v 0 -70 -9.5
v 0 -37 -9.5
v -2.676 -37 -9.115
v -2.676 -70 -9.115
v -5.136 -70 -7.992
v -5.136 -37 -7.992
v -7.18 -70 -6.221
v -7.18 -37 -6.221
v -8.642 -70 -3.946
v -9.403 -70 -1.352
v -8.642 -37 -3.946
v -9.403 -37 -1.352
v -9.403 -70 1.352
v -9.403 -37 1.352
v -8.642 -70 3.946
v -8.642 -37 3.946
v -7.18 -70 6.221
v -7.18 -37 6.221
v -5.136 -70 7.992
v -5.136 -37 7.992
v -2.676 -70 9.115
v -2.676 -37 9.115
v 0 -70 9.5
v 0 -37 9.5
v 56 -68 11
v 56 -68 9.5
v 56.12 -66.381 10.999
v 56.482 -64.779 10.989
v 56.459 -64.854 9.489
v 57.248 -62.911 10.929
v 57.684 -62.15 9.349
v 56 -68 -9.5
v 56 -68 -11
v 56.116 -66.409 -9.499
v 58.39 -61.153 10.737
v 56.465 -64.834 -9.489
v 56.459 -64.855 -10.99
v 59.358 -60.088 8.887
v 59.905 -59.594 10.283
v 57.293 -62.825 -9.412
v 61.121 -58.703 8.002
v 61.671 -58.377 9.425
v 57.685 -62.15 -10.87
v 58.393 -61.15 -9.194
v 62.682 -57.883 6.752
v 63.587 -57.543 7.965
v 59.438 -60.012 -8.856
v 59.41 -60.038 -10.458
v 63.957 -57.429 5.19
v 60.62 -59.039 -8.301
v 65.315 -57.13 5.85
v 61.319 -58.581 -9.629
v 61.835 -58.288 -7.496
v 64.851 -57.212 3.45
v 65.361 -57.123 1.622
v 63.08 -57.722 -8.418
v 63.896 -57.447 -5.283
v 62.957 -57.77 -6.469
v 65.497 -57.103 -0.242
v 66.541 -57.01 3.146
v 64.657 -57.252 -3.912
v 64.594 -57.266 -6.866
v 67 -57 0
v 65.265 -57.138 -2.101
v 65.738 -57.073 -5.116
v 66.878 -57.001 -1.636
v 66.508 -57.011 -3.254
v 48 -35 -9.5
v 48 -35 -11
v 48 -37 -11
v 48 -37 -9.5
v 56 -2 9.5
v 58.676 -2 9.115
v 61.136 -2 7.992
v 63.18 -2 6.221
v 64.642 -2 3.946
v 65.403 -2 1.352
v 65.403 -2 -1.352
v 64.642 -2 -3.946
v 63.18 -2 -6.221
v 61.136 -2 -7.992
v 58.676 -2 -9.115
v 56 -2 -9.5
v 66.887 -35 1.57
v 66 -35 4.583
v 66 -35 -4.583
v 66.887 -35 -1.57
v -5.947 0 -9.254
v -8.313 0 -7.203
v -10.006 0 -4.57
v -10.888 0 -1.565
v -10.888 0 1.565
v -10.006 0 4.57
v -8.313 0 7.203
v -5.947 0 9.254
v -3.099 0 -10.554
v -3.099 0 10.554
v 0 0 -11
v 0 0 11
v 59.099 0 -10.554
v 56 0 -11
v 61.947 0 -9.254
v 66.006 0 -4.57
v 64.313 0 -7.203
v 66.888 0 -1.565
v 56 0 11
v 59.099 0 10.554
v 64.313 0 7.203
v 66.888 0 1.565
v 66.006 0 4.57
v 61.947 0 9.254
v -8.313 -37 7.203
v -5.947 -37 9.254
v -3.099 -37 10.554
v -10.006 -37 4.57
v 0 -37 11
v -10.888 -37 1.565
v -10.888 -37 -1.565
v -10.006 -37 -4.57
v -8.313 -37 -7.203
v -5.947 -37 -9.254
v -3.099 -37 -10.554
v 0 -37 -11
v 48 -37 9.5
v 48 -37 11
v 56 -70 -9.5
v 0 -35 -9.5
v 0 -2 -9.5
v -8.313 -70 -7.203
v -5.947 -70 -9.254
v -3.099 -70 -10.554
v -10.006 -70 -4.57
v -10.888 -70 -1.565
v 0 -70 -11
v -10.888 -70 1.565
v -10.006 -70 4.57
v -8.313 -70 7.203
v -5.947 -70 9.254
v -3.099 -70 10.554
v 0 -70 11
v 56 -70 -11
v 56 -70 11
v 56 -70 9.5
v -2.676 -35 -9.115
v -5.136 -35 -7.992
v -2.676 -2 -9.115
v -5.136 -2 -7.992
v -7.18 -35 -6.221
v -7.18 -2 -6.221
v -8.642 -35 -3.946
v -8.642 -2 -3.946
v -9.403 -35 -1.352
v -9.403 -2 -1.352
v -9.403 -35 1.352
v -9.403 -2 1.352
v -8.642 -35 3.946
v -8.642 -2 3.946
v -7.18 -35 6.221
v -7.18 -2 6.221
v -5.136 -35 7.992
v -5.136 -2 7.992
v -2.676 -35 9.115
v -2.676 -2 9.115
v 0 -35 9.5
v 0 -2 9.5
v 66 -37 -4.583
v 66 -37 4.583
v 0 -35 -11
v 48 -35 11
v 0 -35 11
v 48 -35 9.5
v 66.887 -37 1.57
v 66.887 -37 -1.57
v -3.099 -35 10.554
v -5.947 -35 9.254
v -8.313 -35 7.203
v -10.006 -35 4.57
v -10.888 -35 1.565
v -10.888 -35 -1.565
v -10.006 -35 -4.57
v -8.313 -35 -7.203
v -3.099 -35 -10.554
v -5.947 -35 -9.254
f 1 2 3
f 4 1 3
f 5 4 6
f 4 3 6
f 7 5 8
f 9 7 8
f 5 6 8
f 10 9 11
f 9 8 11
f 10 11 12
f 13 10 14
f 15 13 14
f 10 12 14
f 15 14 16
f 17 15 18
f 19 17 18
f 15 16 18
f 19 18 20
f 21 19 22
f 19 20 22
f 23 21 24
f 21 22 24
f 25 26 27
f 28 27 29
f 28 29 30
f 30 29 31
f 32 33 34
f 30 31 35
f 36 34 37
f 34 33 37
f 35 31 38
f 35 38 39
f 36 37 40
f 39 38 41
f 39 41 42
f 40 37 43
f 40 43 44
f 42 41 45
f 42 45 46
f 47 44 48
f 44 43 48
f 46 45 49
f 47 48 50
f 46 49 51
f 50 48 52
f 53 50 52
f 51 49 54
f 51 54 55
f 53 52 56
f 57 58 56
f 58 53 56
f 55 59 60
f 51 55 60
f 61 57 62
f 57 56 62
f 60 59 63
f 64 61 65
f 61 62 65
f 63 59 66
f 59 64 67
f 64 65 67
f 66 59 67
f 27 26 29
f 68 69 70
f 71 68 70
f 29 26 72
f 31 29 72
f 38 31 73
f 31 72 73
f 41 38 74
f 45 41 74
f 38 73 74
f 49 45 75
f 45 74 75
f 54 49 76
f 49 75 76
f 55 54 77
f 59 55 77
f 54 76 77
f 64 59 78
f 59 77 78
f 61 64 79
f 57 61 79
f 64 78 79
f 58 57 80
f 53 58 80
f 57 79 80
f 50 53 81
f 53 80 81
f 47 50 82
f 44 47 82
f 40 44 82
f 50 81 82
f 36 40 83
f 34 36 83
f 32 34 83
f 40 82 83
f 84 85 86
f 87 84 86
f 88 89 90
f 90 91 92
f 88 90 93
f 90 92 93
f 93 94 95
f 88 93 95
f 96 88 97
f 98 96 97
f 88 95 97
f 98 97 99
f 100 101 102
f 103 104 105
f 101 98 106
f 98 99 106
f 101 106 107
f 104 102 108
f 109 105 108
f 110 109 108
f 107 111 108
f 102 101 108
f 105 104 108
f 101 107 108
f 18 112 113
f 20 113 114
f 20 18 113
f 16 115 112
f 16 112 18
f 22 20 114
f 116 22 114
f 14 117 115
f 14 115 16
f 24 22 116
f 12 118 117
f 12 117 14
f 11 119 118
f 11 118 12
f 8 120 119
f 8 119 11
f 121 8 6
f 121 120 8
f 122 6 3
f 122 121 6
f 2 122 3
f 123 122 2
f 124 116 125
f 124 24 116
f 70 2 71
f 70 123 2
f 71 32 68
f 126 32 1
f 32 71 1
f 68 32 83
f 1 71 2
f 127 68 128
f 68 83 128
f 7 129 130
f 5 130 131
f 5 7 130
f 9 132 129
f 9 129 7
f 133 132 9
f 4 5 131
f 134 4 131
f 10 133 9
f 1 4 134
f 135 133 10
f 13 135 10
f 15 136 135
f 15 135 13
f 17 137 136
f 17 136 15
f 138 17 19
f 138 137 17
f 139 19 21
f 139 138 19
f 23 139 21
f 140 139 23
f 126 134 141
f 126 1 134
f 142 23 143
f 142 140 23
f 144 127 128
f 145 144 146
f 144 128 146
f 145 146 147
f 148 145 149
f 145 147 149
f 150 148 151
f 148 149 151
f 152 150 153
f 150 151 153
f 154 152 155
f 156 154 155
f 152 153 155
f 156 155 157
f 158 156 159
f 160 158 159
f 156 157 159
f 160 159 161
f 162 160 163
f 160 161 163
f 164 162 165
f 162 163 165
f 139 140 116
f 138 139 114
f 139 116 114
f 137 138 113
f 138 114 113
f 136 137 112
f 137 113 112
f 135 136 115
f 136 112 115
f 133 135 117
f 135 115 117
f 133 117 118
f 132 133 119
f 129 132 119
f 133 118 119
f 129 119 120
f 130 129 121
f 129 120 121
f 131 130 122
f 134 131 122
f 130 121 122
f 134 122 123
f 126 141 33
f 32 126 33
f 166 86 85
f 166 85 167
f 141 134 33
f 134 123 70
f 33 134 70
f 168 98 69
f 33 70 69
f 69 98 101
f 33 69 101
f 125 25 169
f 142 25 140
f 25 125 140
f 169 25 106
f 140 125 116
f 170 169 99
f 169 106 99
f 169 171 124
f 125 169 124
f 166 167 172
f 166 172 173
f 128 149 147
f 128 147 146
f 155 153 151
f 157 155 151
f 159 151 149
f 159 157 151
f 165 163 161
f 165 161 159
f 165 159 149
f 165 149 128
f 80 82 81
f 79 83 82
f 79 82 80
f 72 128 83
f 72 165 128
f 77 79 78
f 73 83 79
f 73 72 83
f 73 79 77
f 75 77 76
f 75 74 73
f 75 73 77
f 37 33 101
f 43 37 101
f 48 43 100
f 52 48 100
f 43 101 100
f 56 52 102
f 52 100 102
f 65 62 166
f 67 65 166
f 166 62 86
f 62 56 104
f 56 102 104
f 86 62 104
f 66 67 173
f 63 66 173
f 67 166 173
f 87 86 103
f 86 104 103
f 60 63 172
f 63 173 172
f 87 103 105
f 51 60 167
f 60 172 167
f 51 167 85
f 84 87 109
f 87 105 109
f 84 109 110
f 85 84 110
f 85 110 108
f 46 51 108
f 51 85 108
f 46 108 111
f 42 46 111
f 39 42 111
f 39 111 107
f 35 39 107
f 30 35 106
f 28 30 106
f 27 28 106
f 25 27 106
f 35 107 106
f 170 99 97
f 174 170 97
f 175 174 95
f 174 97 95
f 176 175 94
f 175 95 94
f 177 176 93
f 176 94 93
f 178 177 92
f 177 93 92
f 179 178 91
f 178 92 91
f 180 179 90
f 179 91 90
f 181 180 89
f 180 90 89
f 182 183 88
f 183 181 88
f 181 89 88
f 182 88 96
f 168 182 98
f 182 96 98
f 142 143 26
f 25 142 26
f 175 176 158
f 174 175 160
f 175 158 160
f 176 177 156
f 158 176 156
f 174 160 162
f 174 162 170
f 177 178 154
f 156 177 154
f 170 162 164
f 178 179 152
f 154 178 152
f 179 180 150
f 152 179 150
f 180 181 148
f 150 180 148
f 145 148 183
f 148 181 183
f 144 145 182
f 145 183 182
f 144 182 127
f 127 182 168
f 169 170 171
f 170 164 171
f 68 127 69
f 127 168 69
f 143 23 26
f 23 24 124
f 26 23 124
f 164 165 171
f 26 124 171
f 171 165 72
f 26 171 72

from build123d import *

# Parameters (mm, degrees)
F1_DEPTH = 70
F2_DEPTH = 2
F4_DEPTH = 25
F5_W     = 61
F5_H     = 2
F5_W_2   = 2
F6_DEPTH = 25


with BuildPart() as f1:
    # F0 (on Front) → F1 (new body)
    with BuildSketch(Plane.XZ):
        with BuildLine():
            Line((56, 11), (0, 11))
            ThreePointArc((0, 11), (-11, 0), (0, -11))
            Line((0, -11), (56, -11))
            ThreePointArc((56, -11), (67, 0), (56, 11))
        make_face()
        with BuildLine():
            ThreePointArc((0, -9.5), (-9.5, 0), (0, 9.5))
            Line((0, 9.5), (56, 9.5))
            ThreePointArc((56, 9.5), (65.5, 0), (56, -9.5))
            Line((56, -9.5), (0, -9.5))
        make_face(mode=Mode.SUBTRACT)
    extrude(amount=F1_DEPTH)

    # F0 (on Front) → F2 (join)
    with BuildSketch(Plane.XZ):
        with BuildLine():
            Line((56, 9.5), (0, 9.5))
            ThreePointArc((0, 9.5), (-9.5, 0), (0, -9.5))
            Line((0, -9.5), (56, -9.5))
            ThreePointArc((56, -9.5), (65.5, 0), (56, 9.5))
        make_face()
    extrude(amount=F2_DEPTH)

    # F3 (on face) → F4 (cut)
    with BuildSketch(Plane(origin=(0, 0, -11), x_dir=(1, 0, 0), z_dir=(0, 0, -1))):
        with BuildLine():
            Line((67, 70), (56, 70))
            Line((56, 70), (56, 68))
            ThreePointArc((56, 68), (59.221825, 60.221825), (67, 57))
            Line((67, 57), (67, 70))
        make_face()
    extrude(amount=-F4_DEPTH, mode=Mode.SUBTRACT)

    # F5 (on face) → F6 (cut)
    with BuildSketch(Plane(origin=(0, 0, -11), x_dir=(1, 0, 0), z_dir=(0, 0, -1))):
        with Locations((17.5, 36)):
            Rectangle(F5_W, F5_H)
        with Locations((67, 36)):
            Rectangle(F5_W_2, F5_H)
    extrude(amount=-F6_DEPTH, mode=Mode.SUBTRACT)


solid = f1.part
